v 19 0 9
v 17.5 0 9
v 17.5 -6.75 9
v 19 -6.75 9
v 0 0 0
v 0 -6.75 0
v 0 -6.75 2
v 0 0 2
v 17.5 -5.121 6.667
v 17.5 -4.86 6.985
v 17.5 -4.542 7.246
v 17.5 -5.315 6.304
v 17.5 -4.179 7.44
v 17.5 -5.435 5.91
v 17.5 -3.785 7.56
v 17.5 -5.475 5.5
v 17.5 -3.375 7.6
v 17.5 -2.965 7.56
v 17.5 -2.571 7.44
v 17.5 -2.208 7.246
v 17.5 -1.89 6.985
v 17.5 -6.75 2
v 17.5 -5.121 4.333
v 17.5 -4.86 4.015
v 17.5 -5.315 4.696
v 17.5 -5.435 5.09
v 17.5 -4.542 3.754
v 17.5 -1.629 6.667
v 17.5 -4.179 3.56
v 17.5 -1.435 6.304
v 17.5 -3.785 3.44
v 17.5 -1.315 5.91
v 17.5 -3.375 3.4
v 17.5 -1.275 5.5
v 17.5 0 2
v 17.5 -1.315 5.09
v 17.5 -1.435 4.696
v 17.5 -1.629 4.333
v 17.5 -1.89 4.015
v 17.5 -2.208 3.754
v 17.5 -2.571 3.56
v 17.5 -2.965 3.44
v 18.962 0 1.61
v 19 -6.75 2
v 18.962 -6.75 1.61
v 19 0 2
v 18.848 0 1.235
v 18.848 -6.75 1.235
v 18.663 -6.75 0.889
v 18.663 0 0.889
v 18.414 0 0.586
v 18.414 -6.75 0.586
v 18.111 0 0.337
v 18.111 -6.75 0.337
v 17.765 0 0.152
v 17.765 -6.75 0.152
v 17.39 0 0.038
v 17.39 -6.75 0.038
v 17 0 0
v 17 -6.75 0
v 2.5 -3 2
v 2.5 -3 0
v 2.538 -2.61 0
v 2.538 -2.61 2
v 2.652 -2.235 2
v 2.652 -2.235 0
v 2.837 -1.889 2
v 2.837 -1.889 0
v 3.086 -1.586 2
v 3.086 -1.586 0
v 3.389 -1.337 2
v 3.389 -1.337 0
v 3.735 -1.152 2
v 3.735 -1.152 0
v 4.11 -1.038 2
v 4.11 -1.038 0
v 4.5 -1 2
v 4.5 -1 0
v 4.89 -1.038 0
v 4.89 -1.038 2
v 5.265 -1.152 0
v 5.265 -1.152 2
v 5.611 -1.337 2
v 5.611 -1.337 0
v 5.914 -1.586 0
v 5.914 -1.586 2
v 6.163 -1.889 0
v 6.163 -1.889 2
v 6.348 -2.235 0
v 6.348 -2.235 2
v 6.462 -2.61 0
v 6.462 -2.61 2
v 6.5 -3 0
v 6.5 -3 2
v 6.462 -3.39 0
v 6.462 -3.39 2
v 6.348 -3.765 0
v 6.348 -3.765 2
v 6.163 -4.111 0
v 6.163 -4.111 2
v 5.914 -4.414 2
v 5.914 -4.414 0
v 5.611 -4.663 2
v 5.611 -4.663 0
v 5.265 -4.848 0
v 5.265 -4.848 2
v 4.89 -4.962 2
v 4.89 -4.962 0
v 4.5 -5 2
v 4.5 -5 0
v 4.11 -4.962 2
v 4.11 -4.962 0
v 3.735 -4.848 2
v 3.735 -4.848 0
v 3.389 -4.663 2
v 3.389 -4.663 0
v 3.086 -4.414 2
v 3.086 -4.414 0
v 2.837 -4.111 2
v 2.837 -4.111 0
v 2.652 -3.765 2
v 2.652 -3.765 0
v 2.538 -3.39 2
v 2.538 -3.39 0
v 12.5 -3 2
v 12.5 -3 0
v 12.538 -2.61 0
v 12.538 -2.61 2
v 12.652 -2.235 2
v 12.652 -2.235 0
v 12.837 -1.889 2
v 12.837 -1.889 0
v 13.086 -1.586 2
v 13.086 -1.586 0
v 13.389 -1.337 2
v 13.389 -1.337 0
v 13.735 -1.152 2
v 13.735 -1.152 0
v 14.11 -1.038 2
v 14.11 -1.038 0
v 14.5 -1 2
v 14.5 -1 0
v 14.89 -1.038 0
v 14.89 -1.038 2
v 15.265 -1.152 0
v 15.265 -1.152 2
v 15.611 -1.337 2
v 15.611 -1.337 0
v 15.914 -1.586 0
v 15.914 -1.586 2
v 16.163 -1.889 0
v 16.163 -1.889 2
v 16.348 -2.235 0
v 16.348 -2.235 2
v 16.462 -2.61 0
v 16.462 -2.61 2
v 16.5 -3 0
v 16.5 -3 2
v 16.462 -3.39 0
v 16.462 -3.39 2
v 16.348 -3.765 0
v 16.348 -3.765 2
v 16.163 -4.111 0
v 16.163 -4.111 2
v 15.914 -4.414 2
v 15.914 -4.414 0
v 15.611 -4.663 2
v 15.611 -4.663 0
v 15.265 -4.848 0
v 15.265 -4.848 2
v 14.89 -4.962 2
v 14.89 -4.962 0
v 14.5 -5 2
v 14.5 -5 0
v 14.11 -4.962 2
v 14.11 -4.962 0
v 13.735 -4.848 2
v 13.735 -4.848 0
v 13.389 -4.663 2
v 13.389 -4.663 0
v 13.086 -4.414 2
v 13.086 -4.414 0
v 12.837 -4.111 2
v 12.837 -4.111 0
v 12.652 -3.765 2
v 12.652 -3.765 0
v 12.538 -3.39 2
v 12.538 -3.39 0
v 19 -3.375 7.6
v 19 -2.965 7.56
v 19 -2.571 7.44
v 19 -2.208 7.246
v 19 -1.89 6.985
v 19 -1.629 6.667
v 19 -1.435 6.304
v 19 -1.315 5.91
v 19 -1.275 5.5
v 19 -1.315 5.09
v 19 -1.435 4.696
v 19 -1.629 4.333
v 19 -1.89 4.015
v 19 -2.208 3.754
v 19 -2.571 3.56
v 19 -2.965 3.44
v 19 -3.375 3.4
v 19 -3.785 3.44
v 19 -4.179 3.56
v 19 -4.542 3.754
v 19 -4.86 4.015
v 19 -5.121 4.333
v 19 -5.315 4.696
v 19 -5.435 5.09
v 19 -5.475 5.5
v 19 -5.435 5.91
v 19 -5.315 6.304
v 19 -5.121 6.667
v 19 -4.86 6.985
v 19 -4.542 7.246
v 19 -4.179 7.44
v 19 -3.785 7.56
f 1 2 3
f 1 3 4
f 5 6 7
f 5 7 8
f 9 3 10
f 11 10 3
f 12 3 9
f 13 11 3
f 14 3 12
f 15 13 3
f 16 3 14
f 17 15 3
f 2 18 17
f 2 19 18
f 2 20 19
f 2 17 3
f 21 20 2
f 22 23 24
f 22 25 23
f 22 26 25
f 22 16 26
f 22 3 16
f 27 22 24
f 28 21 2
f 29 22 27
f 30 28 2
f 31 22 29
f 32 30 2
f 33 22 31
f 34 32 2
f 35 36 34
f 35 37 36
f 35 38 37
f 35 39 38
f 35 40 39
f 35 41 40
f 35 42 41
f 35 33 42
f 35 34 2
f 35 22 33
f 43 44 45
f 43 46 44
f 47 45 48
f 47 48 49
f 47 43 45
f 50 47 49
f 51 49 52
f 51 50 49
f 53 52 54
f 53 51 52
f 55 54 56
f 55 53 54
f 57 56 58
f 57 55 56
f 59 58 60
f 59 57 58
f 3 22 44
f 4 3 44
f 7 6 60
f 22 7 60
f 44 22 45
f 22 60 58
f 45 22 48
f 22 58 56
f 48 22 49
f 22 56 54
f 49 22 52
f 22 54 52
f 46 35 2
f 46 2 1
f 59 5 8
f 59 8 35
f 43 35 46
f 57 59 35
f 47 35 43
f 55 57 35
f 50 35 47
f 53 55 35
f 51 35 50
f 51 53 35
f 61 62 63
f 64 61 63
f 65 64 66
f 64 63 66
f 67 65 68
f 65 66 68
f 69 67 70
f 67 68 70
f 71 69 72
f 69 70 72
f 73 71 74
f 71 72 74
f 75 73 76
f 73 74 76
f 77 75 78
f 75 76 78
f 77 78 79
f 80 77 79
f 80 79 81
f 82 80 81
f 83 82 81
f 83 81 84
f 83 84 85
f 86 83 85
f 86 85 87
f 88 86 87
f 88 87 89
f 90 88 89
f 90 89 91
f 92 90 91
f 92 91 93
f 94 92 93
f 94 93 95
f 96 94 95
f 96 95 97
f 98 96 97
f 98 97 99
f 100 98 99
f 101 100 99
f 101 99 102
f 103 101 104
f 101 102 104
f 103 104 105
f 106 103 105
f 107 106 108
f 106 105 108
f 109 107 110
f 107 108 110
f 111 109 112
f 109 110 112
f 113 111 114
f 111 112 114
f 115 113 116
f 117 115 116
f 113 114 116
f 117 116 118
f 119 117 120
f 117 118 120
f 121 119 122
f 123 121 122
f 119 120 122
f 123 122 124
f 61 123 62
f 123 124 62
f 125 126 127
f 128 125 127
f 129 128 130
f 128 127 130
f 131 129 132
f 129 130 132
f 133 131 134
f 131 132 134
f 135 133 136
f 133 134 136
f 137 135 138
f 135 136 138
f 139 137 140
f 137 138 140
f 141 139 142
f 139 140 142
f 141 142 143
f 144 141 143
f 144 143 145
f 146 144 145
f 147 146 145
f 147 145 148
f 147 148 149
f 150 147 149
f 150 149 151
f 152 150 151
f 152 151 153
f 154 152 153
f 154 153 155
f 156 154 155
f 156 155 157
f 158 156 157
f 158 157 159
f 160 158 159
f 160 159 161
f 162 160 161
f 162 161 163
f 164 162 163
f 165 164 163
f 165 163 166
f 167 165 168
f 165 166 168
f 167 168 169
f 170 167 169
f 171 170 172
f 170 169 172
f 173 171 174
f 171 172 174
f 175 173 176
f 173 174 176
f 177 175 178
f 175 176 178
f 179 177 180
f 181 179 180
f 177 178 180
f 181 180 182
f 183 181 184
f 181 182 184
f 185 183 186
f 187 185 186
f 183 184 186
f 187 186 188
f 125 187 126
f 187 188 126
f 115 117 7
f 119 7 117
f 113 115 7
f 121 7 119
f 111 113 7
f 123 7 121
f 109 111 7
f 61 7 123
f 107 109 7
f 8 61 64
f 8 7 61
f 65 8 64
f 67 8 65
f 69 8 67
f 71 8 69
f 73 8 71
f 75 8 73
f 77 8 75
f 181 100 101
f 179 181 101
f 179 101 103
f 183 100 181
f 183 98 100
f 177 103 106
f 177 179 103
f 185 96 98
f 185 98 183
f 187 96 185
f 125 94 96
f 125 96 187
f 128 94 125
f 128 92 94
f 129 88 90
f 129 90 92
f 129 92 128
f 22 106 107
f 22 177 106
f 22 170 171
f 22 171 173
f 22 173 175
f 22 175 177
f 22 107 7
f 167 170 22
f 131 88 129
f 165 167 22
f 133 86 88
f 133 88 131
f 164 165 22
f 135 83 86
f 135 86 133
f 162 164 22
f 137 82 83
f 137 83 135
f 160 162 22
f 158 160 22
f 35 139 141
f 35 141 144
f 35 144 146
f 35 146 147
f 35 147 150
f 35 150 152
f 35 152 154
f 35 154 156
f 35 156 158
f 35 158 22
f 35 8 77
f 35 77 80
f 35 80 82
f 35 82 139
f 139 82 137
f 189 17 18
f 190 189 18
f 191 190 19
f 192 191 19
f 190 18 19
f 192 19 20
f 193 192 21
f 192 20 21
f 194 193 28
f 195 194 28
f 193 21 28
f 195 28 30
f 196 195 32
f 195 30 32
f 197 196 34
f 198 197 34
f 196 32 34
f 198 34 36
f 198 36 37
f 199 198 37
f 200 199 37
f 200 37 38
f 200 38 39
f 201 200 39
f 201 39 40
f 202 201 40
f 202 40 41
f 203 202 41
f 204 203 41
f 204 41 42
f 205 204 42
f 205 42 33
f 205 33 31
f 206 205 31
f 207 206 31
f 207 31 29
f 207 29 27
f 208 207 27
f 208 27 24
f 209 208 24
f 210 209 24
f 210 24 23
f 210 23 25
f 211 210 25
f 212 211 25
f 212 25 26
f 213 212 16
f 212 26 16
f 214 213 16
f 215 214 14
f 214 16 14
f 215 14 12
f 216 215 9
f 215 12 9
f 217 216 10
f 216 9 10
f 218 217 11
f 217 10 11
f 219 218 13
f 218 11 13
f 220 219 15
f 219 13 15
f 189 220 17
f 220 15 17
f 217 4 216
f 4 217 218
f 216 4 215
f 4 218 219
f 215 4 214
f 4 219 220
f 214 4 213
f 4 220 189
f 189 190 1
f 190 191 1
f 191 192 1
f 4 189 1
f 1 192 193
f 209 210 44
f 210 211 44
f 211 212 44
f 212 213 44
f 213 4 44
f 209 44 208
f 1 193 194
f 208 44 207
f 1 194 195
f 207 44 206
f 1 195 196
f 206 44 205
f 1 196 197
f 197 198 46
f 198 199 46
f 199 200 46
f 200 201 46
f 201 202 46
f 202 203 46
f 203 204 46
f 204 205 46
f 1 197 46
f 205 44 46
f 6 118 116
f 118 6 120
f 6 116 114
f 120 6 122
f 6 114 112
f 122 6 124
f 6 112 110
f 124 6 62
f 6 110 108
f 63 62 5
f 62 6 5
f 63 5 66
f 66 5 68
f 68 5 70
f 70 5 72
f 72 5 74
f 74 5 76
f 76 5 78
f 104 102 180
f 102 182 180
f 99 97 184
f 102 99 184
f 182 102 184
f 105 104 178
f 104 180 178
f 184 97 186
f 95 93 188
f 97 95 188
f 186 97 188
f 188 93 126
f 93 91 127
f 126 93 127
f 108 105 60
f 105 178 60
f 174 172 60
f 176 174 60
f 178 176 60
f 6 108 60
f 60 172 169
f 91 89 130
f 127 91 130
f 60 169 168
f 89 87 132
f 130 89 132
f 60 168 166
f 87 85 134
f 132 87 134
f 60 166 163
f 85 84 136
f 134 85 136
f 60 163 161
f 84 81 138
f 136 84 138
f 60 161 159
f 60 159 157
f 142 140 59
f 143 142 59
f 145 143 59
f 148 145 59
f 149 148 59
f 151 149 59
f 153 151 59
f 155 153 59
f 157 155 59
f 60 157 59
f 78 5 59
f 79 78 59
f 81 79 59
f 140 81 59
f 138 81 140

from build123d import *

# Parameters (mm, degrees)
ESQUISSE1_W             = 19
ESQUISSE1_H             = 6.75
BOSS_EXTRU_1_DEPTH      = 2
ESQUISSE4_R             = 2
ENL_V_MAT_EXTRU_1_DEPTH = 10
ESQUISSE6_W             = 1.5
ESQUISSE6_H             = 6.75
BOSS_EXTRU_2_DEPTH      = 7
CONG_1_R                = 2
ESQUISSE7_R             = 2.1
ENL_V_MAT_EXTRU_2_DEPTH = 3


with BuildPart() as part:
    # Esquisse1 → Boss.-Extru.1 (new body)
    with BuildSketch(Plane.XY):
        with Locations((9.5, -3.375)):
            Rectangle(ESQUISSE1_W, ESQUISSE1_H)
    extrude(amount=BOSS_EXTRU_1_DEPTH)

    # Esquisse4 → Enlèv. mat.-Extru.1 (cut)
    with BuildSketch(Plane(origin=(0, 0, 0), x_dir=(-1, 0, 0), z_dir=(0, 0, -1))):
        with Locations((-14.5, -3)):
            Circle(ESQUISSE4_R)
        with Locations((-4.5, -3)):
            Circle(ESQUISSE4_R)
    extrude(amount=-ENL_V_MAT_EXTRU_1_DEPTH, mode=Mode.SUBTRACT)

    # Esquisse6 → Boss.-Extru.2 (add)
    with BuildSketch(Plane.XY.offset(2)):
        with Locations((18.25, -3.375)):
            Rectangle(ESQUISSE6_W, ESQUISSE6_H)
    extrude(amount=BOSS_EXTRU_2_DEPTH)

    # Congé1
    cong_1_edges = [part.edges().sort_by_distance(p)[0] for p in [
        (19, -3.375, 0),
    ]]
    fillet(cong_1_edges, radius=CONG_1_R)

    # Esquisse7 → Enlèv. mat.-Extru.2 (cut)
    with BuildSketch(Plane.ZY.offset(-17.5)):
        with Locations((5.5, -3.375)):
            Circle(ESQUISSE7_R)
    extrude(amount=-ENL_V_MAT_EXTRU_2_DEPTH, mode=Mode.SUBTRACT)


solid = part.part
